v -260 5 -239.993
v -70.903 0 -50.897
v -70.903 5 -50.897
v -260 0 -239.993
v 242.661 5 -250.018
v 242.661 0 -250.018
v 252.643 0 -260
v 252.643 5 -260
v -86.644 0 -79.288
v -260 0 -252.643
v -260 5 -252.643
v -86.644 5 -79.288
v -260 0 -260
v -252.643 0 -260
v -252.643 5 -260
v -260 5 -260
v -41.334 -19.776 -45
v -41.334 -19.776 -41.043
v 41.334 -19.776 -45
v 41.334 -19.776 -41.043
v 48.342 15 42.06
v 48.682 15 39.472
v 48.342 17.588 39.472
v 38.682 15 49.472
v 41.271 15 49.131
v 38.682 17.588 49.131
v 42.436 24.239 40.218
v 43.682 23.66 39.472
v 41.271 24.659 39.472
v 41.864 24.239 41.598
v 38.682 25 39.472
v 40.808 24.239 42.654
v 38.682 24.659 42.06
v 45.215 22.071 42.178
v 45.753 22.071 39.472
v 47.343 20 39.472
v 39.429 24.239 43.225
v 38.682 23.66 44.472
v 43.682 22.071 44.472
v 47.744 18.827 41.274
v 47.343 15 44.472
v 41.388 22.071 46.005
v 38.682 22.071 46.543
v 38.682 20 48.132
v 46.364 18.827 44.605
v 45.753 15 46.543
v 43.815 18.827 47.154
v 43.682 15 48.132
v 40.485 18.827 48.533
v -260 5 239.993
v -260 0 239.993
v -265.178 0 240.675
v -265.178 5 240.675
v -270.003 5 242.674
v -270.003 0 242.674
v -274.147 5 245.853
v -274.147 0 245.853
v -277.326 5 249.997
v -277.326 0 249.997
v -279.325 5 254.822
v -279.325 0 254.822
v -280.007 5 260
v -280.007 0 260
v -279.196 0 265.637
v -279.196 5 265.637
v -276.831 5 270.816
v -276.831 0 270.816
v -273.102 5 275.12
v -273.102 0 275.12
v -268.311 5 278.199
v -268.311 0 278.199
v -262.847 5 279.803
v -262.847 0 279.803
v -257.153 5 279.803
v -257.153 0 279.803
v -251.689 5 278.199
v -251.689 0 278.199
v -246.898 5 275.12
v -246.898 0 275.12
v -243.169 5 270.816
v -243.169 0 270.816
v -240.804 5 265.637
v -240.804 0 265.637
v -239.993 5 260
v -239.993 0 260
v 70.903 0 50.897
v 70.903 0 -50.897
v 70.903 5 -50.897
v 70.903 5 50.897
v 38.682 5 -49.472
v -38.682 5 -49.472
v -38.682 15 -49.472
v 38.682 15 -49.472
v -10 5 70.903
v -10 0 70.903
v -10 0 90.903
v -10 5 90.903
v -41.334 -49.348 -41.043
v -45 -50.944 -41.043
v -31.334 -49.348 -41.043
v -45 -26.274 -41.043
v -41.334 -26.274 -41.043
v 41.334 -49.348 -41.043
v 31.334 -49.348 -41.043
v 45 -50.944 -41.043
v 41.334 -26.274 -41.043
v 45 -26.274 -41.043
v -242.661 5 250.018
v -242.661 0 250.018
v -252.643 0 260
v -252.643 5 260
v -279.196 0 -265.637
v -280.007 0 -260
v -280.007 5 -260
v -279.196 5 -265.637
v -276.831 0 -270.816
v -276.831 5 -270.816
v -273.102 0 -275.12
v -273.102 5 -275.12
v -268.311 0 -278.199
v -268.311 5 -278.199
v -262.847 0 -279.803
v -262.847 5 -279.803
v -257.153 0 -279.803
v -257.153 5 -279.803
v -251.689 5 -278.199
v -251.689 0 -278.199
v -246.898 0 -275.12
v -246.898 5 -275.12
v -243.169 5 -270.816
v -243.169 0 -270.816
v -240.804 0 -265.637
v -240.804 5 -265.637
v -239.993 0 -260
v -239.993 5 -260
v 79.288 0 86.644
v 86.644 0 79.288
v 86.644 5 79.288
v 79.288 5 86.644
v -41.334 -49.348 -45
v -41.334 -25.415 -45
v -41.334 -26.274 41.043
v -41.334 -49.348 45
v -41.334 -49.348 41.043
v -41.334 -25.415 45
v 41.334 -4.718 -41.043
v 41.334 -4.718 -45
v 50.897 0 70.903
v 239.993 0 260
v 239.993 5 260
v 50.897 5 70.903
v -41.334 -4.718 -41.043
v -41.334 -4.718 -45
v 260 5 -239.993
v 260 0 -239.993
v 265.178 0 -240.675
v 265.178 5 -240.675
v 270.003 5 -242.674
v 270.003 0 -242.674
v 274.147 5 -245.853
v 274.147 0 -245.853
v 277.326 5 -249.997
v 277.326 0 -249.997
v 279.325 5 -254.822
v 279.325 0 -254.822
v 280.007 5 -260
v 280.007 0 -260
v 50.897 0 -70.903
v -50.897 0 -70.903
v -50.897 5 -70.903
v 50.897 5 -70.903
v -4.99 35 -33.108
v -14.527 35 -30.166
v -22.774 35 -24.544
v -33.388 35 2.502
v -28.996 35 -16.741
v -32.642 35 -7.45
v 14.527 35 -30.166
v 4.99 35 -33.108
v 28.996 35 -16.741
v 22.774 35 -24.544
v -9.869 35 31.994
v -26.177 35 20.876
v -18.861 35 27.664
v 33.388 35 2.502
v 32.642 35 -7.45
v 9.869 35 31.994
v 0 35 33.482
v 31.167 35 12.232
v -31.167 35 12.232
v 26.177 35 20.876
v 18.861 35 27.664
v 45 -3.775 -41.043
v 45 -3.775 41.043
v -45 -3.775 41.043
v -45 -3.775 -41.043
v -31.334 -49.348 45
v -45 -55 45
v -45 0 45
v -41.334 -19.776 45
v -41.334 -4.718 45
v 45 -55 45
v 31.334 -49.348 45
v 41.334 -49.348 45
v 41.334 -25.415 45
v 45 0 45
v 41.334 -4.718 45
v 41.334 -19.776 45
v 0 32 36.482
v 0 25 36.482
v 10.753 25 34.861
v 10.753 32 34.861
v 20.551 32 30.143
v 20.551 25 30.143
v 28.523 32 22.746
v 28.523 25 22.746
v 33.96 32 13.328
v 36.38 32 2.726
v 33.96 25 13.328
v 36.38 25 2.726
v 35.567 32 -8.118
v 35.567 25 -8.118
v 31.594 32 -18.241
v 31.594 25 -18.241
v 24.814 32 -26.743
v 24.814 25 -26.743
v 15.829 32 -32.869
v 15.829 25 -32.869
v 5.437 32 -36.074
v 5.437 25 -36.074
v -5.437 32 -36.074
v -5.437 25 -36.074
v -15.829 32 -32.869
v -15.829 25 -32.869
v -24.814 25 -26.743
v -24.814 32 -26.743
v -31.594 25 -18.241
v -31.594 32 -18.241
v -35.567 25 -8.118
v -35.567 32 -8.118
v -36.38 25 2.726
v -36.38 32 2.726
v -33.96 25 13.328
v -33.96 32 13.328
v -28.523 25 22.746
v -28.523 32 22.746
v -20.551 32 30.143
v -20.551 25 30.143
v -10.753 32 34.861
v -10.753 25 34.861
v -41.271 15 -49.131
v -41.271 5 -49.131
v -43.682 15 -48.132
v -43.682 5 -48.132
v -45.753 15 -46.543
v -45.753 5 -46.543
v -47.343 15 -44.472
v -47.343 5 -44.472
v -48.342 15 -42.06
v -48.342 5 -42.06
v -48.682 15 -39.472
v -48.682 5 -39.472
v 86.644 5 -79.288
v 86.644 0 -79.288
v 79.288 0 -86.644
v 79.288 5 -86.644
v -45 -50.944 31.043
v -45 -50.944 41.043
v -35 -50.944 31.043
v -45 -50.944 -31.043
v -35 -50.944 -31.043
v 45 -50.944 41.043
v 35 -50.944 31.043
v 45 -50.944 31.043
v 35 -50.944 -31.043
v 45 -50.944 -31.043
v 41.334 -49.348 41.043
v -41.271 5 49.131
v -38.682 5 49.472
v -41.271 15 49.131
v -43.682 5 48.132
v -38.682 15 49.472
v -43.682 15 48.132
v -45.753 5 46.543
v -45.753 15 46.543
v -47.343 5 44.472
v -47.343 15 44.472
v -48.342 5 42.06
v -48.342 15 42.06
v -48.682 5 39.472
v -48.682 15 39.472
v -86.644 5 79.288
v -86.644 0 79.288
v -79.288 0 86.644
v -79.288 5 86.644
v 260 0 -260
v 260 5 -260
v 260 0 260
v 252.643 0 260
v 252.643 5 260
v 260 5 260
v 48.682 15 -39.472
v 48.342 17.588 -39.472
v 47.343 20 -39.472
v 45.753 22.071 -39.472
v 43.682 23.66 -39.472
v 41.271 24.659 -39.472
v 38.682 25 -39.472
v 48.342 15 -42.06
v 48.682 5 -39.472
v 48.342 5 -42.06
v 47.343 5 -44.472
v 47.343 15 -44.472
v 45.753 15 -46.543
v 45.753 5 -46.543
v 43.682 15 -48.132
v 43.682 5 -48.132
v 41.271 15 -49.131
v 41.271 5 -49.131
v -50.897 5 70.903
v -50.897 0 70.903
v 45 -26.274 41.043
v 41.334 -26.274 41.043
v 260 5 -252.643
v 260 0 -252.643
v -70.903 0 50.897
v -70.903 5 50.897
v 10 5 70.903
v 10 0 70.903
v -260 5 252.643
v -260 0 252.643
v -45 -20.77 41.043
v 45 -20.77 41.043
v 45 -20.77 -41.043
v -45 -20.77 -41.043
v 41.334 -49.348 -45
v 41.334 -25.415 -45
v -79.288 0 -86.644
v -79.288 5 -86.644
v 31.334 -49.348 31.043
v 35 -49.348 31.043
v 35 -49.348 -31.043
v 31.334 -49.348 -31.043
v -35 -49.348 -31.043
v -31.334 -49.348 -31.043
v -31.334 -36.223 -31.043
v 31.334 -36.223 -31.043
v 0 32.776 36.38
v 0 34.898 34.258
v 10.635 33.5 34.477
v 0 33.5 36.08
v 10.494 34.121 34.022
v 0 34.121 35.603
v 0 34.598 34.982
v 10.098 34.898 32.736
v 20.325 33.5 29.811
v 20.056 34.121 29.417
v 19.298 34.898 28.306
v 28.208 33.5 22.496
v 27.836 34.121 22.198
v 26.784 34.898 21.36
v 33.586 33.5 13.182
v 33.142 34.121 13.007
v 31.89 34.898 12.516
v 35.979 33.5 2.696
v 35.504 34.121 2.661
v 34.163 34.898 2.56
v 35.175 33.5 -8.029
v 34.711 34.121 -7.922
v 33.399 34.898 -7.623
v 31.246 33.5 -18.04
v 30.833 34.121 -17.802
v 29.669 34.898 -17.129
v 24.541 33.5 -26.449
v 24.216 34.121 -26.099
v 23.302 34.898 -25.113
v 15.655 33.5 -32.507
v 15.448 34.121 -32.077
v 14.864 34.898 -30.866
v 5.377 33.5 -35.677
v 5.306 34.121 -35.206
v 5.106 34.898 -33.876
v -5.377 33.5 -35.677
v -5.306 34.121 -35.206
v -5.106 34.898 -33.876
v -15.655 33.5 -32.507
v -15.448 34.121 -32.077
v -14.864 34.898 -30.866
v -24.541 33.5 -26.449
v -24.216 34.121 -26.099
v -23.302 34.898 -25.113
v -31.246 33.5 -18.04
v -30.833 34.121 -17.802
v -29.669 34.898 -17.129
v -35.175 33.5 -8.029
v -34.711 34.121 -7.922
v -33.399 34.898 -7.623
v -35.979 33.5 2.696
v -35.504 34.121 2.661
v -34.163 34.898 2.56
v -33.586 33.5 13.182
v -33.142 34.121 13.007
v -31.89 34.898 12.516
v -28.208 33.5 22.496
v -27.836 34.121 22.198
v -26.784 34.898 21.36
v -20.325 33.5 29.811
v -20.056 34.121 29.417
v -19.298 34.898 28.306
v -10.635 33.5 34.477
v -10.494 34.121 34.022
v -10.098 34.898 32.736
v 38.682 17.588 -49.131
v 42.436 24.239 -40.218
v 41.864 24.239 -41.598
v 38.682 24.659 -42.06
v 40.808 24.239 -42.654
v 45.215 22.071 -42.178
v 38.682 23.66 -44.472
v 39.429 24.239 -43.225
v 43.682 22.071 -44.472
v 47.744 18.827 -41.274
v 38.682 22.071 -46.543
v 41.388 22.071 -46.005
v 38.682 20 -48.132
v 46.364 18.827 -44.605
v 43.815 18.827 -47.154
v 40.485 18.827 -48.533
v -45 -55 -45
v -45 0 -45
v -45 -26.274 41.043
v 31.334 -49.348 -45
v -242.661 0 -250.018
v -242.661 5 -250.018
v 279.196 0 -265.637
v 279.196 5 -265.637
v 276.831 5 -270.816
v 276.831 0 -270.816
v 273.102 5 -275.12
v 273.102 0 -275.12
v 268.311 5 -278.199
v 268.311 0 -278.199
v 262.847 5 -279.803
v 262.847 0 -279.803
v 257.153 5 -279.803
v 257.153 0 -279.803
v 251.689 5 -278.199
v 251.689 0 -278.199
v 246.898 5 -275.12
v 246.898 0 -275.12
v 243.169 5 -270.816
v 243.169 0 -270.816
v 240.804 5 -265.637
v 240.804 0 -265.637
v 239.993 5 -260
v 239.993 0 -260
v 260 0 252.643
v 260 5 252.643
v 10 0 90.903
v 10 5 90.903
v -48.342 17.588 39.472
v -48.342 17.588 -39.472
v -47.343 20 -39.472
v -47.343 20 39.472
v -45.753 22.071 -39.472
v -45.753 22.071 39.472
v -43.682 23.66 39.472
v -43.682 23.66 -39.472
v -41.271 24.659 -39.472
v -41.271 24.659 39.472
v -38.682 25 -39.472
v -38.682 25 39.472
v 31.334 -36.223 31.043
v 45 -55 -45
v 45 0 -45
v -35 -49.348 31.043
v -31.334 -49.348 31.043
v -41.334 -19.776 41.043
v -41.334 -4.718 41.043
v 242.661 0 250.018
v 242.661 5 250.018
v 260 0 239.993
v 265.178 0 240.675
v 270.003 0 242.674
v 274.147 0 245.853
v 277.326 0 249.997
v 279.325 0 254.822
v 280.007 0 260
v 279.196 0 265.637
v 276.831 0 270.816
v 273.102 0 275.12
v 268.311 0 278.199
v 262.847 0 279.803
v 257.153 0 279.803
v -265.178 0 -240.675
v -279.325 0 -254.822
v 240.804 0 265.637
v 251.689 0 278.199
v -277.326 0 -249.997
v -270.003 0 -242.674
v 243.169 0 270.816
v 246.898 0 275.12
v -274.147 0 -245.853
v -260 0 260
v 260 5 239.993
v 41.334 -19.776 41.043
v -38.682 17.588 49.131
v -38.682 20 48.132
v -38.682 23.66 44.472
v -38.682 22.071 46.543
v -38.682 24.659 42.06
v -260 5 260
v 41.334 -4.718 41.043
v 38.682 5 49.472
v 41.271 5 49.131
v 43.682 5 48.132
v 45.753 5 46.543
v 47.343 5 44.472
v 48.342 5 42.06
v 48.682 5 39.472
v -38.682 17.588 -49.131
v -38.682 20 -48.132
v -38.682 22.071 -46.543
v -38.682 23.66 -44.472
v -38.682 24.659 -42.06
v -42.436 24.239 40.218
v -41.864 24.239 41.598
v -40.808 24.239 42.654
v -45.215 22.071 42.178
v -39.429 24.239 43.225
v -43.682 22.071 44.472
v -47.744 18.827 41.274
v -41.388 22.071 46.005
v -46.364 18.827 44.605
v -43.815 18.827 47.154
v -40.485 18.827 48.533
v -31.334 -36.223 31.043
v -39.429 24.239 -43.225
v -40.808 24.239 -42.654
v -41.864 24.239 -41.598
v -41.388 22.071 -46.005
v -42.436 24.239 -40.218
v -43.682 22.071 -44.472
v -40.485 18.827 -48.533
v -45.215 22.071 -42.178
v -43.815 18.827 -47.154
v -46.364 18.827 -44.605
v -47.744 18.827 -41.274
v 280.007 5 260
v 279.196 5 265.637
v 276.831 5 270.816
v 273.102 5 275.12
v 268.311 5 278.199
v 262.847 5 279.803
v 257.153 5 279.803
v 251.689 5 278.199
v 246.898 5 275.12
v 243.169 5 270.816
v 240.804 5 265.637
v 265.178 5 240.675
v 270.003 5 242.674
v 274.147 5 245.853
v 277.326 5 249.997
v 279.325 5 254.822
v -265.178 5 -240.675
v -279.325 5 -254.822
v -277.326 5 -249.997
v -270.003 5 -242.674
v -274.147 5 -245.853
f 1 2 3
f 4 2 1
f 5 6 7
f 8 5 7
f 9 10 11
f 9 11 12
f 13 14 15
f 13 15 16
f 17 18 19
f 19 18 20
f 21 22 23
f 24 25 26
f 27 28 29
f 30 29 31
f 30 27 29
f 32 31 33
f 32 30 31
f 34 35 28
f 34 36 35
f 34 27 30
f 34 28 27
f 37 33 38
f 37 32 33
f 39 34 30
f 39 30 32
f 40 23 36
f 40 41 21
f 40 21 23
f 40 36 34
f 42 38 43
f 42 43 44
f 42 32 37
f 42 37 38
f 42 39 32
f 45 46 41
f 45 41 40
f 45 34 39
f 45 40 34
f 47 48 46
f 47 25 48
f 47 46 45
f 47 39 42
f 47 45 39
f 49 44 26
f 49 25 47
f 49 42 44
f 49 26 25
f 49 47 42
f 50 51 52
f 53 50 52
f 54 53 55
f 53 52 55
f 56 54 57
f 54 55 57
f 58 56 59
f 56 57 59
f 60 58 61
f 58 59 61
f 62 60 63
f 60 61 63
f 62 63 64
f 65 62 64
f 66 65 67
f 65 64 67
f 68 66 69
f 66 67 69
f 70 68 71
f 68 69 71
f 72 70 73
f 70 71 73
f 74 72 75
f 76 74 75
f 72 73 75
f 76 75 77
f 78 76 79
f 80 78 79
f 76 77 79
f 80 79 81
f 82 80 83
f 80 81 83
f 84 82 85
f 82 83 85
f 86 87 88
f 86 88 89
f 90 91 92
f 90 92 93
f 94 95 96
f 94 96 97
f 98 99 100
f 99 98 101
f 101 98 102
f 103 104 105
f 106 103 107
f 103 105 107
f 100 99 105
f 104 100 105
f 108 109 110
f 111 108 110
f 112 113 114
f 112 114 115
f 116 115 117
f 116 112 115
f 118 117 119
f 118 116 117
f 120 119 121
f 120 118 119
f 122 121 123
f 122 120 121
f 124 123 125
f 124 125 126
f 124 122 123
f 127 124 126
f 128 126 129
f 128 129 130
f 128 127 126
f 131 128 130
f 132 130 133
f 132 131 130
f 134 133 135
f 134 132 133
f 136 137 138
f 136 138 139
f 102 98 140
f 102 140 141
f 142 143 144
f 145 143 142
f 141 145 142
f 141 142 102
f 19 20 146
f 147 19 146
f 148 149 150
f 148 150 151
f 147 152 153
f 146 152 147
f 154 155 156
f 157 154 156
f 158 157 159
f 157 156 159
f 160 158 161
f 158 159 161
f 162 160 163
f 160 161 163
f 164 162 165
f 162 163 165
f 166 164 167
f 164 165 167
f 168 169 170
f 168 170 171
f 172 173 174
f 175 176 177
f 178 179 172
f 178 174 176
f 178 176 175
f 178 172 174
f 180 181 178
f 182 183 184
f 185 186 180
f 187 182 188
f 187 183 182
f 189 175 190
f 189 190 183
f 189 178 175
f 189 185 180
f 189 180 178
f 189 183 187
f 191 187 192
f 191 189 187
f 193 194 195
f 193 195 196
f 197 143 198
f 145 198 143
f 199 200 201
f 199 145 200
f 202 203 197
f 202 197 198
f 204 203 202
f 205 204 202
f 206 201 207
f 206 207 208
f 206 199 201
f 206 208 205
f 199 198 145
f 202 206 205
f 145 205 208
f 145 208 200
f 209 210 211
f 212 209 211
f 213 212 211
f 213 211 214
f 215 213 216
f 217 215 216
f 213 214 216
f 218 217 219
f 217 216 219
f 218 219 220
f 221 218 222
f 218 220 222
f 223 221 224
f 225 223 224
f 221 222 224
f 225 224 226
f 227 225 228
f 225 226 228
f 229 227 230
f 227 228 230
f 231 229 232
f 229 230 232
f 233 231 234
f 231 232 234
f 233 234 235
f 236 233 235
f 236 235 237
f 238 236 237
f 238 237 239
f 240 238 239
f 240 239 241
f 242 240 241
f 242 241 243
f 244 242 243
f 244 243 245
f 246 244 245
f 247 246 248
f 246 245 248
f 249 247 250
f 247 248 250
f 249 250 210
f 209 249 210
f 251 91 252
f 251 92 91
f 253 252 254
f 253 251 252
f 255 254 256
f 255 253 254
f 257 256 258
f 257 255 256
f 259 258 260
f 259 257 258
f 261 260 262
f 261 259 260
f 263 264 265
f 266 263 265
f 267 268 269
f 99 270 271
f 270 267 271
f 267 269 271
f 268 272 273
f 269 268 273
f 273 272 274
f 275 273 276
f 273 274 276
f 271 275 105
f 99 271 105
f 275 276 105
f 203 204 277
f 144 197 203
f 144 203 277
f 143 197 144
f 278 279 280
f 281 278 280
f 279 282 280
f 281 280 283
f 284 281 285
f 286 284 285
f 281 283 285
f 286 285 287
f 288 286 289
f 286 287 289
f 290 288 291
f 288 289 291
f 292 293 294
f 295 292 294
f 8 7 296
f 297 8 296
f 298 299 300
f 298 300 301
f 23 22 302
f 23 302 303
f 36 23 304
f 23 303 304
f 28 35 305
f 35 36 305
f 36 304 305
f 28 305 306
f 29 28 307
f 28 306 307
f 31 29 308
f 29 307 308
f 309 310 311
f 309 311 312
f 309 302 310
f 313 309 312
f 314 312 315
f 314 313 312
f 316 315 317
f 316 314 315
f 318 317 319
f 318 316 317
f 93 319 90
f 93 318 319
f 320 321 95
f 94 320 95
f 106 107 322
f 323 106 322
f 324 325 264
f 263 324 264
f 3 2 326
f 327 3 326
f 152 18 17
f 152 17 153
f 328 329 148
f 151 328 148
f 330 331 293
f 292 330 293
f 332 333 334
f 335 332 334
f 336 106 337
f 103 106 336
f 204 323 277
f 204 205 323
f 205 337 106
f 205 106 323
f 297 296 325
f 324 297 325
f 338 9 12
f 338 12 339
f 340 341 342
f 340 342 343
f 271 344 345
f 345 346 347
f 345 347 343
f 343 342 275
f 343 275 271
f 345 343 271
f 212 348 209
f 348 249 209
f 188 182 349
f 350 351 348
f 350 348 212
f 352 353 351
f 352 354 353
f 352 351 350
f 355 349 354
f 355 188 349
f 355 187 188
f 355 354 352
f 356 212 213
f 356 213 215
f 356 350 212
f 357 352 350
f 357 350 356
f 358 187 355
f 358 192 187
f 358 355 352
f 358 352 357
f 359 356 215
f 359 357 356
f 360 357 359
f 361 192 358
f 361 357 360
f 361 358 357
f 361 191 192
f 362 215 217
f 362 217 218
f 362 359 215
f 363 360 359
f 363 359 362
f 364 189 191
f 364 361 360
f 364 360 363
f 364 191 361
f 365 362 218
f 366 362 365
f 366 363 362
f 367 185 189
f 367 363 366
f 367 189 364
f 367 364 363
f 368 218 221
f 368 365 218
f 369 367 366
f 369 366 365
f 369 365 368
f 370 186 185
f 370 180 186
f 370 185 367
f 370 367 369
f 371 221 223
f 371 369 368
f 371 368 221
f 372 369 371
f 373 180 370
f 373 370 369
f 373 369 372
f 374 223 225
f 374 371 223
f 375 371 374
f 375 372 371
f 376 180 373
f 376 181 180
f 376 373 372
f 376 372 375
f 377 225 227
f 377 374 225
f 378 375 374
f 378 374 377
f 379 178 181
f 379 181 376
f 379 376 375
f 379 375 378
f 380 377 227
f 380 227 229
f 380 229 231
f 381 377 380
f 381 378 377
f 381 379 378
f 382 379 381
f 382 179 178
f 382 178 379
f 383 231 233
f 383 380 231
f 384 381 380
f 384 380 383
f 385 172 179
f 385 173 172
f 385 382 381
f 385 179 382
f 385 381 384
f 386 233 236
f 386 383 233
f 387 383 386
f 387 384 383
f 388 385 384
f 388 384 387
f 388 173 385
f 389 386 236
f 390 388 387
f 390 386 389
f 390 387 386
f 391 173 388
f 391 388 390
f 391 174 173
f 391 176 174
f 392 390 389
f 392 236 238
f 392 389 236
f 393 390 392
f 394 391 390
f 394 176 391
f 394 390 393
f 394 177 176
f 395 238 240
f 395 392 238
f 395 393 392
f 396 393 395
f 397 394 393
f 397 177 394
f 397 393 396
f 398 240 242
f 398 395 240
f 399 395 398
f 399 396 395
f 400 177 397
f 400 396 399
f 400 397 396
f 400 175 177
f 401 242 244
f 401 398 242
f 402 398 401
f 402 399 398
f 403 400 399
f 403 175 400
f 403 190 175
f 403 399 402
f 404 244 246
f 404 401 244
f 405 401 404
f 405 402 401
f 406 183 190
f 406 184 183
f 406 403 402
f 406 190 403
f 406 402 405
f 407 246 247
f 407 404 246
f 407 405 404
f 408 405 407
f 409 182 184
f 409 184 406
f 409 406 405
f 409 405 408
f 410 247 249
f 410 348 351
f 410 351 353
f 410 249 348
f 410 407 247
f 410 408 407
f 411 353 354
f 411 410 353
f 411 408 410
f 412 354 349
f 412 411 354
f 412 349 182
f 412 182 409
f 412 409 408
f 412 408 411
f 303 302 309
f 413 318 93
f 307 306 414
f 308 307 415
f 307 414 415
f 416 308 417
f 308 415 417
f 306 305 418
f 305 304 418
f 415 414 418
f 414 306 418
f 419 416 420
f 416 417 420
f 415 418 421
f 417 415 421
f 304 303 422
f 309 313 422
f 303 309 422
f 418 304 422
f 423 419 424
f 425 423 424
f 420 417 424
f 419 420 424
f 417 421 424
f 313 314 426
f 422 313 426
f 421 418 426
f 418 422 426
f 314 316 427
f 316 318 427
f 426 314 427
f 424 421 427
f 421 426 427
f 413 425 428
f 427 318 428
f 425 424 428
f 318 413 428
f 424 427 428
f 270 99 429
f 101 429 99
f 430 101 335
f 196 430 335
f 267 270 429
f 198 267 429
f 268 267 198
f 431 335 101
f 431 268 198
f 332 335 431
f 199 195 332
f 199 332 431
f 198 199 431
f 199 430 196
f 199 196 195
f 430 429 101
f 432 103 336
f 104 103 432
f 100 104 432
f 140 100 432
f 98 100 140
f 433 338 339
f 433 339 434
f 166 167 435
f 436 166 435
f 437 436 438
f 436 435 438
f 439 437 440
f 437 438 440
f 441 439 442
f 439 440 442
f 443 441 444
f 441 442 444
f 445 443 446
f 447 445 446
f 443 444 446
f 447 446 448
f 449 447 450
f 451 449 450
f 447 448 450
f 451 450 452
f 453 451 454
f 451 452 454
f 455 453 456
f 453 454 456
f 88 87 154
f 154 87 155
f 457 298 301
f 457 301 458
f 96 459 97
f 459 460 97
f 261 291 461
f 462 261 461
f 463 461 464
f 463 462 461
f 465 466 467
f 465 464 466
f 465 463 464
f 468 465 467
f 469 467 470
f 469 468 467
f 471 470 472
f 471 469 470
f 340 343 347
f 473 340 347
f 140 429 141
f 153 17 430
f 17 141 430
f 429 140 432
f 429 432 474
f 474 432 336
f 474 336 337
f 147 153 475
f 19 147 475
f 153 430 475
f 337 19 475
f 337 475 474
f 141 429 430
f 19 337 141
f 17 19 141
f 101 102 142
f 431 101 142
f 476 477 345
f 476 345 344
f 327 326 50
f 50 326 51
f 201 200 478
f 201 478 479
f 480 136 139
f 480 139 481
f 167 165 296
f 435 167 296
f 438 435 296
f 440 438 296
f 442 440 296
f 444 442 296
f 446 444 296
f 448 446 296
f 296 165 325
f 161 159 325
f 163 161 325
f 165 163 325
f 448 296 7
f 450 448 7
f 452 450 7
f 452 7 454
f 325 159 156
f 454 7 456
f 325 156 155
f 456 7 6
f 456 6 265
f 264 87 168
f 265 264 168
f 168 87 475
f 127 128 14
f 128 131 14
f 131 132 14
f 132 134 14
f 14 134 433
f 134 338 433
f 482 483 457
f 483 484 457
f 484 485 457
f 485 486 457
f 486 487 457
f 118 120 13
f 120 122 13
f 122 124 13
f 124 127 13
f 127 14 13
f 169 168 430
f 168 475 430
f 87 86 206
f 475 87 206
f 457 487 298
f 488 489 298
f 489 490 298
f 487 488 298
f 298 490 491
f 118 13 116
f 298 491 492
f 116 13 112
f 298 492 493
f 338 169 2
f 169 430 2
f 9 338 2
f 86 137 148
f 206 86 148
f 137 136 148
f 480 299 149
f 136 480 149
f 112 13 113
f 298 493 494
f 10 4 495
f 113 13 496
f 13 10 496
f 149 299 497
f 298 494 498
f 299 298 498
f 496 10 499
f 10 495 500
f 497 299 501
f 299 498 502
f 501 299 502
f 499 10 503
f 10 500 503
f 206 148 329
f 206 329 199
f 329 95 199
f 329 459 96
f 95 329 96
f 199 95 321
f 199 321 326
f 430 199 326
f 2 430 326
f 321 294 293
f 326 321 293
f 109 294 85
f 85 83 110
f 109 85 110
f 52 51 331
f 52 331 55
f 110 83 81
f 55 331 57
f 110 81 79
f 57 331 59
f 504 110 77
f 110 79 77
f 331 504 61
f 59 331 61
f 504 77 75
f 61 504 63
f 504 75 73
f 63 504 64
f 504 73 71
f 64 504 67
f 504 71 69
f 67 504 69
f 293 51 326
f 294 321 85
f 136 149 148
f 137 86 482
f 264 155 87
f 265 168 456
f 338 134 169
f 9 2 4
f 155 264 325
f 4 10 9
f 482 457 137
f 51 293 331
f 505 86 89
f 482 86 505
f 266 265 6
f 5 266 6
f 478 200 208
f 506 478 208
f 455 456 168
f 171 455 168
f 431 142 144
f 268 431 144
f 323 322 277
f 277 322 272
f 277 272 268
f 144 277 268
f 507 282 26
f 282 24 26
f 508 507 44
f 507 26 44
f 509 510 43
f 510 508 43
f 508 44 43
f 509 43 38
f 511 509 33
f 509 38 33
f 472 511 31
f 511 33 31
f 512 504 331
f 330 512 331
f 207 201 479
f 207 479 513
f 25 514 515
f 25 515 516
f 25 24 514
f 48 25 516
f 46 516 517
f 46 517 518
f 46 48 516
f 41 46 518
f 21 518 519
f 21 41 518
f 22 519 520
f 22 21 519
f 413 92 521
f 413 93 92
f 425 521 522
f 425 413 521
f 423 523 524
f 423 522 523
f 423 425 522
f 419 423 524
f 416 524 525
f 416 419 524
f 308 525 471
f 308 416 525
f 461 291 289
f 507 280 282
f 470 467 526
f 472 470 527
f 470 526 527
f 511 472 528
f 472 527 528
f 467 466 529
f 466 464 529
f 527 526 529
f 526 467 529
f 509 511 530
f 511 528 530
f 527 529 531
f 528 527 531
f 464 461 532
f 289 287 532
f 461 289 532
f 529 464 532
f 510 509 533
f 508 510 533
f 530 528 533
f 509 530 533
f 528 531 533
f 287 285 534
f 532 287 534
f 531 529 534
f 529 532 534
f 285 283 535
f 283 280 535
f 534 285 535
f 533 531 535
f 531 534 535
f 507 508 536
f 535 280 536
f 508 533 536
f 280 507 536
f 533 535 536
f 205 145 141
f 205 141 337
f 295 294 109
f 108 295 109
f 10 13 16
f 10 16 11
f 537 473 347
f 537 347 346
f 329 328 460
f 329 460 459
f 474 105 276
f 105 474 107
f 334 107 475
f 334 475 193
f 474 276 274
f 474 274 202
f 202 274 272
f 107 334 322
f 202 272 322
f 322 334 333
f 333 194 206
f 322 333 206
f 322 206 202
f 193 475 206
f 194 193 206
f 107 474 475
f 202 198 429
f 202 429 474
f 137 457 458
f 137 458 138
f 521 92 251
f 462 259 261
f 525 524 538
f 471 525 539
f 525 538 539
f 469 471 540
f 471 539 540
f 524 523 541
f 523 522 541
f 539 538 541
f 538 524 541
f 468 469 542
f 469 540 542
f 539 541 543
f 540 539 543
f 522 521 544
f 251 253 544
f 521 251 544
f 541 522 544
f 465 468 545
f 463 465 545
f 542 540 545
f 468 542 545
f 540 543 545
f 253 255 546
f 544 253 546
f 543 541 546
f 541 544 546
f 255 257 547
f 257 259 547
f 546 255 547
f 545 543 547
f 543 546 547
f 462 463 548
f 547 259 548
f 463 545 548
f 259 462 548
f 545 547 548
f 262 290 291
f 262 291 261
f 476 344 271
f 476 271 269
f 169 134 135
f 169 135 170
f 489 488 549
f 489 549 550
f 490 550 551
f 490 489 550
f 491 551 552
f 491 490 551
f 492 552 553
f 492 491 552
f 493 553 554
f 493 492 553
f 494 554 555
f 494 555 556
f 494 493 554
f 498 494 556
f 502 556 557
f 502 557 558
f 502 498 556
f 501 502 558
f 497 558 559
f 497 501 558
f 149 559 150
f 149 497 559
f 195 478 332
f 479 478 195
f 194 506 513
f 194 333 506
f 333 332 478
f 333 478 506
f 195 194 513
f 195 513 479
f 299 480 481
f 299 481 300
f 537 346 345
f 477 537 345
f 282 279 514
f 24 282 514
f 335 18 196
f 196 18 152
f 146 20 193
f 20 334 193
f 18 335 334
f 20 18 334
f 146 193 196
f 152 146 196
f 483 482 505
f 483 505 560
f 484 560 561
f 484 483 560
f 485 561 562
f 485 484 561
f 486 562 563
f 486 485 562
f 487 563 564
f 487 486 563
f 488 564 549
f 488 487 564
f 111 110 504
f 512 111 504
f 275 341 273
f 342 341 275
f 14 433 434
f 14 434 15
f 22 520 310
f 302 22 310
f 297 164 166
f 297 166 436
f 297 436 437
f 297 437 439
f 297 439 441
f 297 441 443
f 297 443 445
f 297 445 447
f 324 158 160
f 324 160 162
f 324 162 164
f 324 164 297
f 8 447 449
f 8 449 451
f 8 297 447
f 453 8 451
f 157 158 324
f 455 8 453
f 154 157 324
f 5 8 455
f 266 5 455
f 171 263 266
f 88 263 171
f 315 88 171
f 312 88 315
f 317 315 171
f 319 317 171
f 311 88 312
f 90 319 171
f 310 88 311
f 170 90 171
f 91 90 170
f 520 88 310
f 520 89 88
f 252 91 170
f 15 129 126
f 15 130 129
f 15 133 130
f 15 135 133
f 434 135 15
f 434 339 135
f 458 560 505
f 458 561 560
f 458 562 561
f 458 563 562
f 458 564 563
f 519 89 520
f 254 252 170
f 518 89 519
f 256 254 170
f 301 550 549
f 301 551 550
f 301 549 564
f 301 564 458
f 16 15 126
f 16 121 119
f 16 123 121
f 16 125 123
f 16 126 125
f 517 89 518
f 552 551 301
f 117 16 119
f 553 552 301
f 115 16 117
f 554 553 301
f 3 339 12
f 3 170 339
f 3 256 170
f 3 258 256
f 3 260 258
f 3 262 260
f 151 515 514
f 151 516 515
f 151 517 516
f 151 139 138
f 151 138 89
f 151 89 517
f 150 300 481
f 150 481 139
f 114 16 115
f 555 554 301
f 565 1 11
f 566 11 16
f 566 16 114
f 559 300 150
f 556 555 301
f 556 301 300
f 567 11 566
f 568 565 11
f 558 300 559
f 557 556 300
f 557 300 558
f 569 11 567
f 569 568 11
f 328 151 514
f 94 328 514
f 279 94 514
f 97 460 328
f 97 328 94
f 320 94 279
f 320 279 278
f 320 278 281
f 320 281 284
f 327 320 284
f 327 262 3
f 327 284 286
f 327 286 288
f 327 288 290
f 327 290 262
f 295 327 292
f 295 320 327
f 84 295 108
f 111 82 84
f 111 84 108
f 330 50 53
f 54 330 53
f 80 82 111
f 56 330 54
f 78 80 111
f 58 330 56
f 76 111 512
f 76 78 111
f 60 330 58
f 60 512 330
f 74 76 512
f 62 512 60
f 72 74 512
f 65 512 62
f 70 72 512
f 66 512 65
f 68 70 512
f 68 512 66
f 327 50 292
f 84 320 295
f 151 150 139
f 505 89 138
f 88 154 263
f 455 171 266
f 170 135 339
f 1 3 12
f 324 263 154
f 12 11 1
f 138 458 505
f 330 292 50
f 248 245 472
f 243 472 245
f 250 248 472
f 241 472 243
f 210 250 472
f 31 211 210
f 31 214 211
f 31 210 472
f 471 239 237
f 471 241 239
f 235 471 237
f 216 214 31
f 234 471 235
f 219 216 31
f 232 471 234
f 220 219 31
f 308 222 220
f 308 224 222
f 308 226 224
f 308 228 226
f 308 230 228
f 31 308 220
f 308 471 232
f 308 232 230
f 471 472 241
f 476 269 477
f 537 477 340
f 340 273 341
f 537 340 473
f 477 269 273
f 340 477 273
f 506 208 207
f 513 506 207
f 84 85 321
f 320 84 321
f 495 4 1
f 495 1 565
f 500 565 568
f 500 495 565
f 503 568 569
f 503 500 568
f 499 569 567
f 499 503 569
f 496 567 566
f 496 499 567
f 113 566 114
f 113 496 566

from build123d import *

# Parameters (mm, degrees)
EXTRUDE_1_DEPTH     = 5
SKETCH_2_W          = 90
SKETCH_2_H          = 90
EXTRUDE_2_DEPTH     = 25
SKETCH_3_W          = 82.667839838
SKETCH_3_H          = 15.058257345
CUT_EXTRUDE_1_DEPTH = 90
SKETCH_4_W          = 82.085695662
SKETCH_4_H          = 16.995101666
CUT_EXTRUDE_2_DEPTH = 90
SKETCH_5_W          = 97.364780094
SKETCH_5_H          = 98.94366842
EXTRUDE_3_DEPTH     = 20
FILLET_1_R          = 10
SKETCH_6_W          = 90
SKETCH_6_H          = 90
EXTRUDE_4_DEPTH     = 30
CUT_EXTRUDE_3_DEPTH = 90
SKETCH_8_W          = 62.667839838
SKETCH_8_H          = 13.124346315
CUT_EXTRUDE_4_DEPTH = 10
CUT_EXTRUDE_5_DEPTH = 90
SKETCH_10_W         = 62.085695662
SKETCH_10_H         = 21.626220655
CUT_EXTRUDE_6_DEPTH = 10
SKETCH_11_W         = 62.667839838
SKETCH_11_H         = 13.124346315
CUT_EXTRUDE_7_DEPTH = 10
SKETCH_12_W         = 62.085695662
SKETCH_12_H         = 21.626220655
CUT_EXTRUDE_8_DEPTH = 10
EXTRUDE_5_DEPTH     = 20
SKETCH_14_R         = 36.481947273
EXTRUDE_6_DEPTH     = 10
FILLET_2_R          = 3


with BuildPart() as part:
    # 草图1 → 凸台-拉伸1 (new body)
    with BuildSketch(Plane(origin=(0, 0, 0), x_dir=(1, 0, 0), z_dir=(0, 1, 0))):
        Polygon((0, 70.903454713), (0, 0), (70.90345471, 0), (70.90345471, 50.896669322), (70.90345471, 63.546624398), (70.90345471, 70.903454713), (63.546624395, 70.903454713), (50.896669319, 70.903454713), align=None)
        Polygon((72.962659229, 92.969444623), (50.896669319, 70.903454713), (63.546624395, 70.903454713), (79.287636767, 86.644467085), align=None)
        Polygon((70.90345471, 70.903454713), (70.90345471, 63.546624398), (86.644467082, 79.28763677), (79.287636767, 86.644467085), (63.546624395, 70.903454713), align=None)
        Polygon((70.90345471, 63.546624398), (70.90345471, 50.896669322), (92.96944462, 72.962659232), (86.644467082, 79.28763677), align=None)
        with BuildLine():
            ThreePointArc((242.661241038, 250.018071355), (240.67172678, 254.833829646), (239.993214606, 260))
            Line((239.993214606, 260), (72.962659229, 92.969444623))
            Line((72.962659229, 92.969444623), (79.287636767, 86.644467085))
            Line((79.287636767, 86.644467085), (242.661241038, 250.018071355))
        make_face()
        with BuildLine():
            Line((92.96944462, 72.962659232), (260, 239.993214612))
            ThreePointArc((260, 239.993214606), (254.833829644, 240.67172678), (250.018071352, 242.66124104))
            Line((250.018071352, 242.66124104), (86.644467082, 79.28763677))
            Line((86.644467082, 79.28763677), (92.96944462, 72.962659232))
        make_face()
        with BuildLine():
            Line((260, 252.643169688), (260, 239.993214612))
            ThreePointArc((260, 239.993214606), (274.146933622, 245.853066378), (280.006785394, 260))
            ThreePointArc((280.006785394, 260), (260, 280.006785394), (239.993214606, 260))
            Line((239.993214606, 260), (252.643169682, 260))
            Line((252.643169682, 260), (260, 260))
            Line((260, 260), (260, 252.643169688))
        make_face()
        with BuildLine():
            Line((252.643169682, 260), (239.993214606, 260))
            ThreePointArc((239.993214606, 260), (240.67172678, 254.833829646), (242.661241038, 250.018071355))
            Line((242.661241038, 250.018071355), (252.643169682, 260))
        make_face()
        with BuildLine():
            ThreePointArc((250.018071352, 242.66124104), (254.833829644, 240.67172678), (260, 239.993214606))
            Line((260, 239.993214612), (260, 252.643169688))
            Line((260, 252.643169688), (250.018071352, 242.66124104))
        make_face()
    extrude_1 = extrude(amount=EXTRUDE_1_DEPTH)

    # 镜向1: 凸台-拉伸1 across plane
    add(extrude_1.mirror(Plane(origin=(0, 5, 0), x_dir=(0, 0, 1), z_dir=(1, 0, 0))))

    # 镜向3: part across plane


with BuildPart() as part_1:
    add(part.part)
    add(part.part.mirror(Plane(origin=(0, 5, 0), x_dir=(1, 0, 0), z_dir=(0, 0, -1))))

    # 草图2 → 凸台-拉伸2 (add)
    with BuildSketch(Plane.XZ):
        Rectangle(SKETCH_2_W, SKETCH_2_H)
    extrude(amount=EXTRUDE_2_DEPTH)

    # 草图3 → 切除-拉伸1 (cut)
    with BuildSketch(Plane.XY.offset(45)):
        with Locations((0, -12.246888496)):
            Rectangle(SKETCH_3_W, SKETCH_3_H)
    extrude(amount=-CUT_EXTRUDE_1_DEPTH, mode=Mode.SUBTRACT)

    # 草图4 → 切除-拉伸2 (cut)
    with BuildSketch(Plane(origin=(45, 0, 0), x_dir=(0, 0, -1), z_dir=(1, 0, 0))):
        with Locations((0, -12.272398252)):
            Rectangle(SKETCH_4_W, SKETCH_4_H)
    extrude(amount=-CUT_EXTRUDE_2_DEPTH, mode=Mode.SUBTRACT)

    # 草图5 → 凸台-拉伸3 (add)
    with BuildSketch(Plane(origin=(0, 5, 0), x_dir=(1, 0, 0), z_dir=(0, 1, 0))):
        Rectangle(SKETCH_5_W, SKETCH_5_H)
    extrude(amount=EXTRUDE_3_DEPTH)

    # 圆角1
    fillet_1_edges = [part_1.edges().sort_by_distance(p)[0] for p in [
        (48.682390047, 15, 49.47183421),
        (48.682390047, 15, -49.47183421),
        (-48.682390047, 15, -49.47183421),
        (-48.682390047, 15, 49.47183421),
        (48.682390047, 25, 0),
        (0, 25, -49.47183421),
        (-48.682390047, 25, 0),
        (0, 25, 49.47183421),
    ]]
    fillet(fillet_1_edges, radius=FILLET_1_R)

    # 草图6 → 凸台-拉伸4 (add)
    with BuildSketch(Plane.XZ.offset(25)):
        Rectangle(SKETCH_6_W, SKETCH_6_H)
    extrude(amount=EXTRUDE_4_DEPTH)

    # 草图7 → 切除-拉伸3 (cut)
    with BuildSketch(Plane.XY.offset(45)):
        Polygon((-41.333919919, -25.414932676), (41.333919919, -25.414932676), (41.333919919, -49.347564191), (31.333919919, -49.347564191), (31.333919919, -36.223217876), (-31.333919919, -36.223217876), (-31.333919919, -49.347564191), (-41.333919919, -49.347564191), align=None)
    extrude(amount=-CUT_EXTRUDE_3_DEPTH, mode=Mode.SUBTRACT)

    # 草图8 → 切除-拉伸4 (cut)
    with BuildSketch(Plane.XY.offset(45)):
        with Locations((0, -42.785391034)):
            Rectangle(SKETCH_8_W, SKETCH_8_H)
    extrude(amount=-CUT_EXTRUDE_4_DEPTH, mode=Mode.SUBTRACT)

    # 草图9 → 切除-拉伸5 (cut)
    with BuildSketch(Plane(origin=(45, 0, 0), x_dir=(0, 0, -1), z_dir=(1, 0, 0))):
        Polygon((-41.042847831, -26.273596919), (-41.042847831, -50.943507888), (-31.042847831, -50.943507888), (-31.042847831, -29.317287233), (31.042847831, -29.317287233), (31.042847831, -50.943507888), (41.042847831, -50.943507888), (41.042847831, -26.273596919), align=None)
    extrude(amount=-CUT_EXTRUDE_5_DEPTH, mode=Mode.SUBTRACT)

    # 草图10 → 切除-拉伸6 (cut)
    with BuildSketch(Plane(origin=(45, 0, 0), x_dir=(0, 0, -1), z_dir=(1, 0, 0))):
        with Locations((0, -40.130397561)):
            Rectangle(SKETCH_10_W, SKETCH_10_H)
    extrude(amount=-CUT_EXTRUDE_6_DEPTH, mode=Mode.SUBTRACT)

    # 草图11 → 切除-拉伸7 (cut)
    with BuildSketch(Plane(origin=(0, 0, -45), x_dir=(-1, 0, 0), z_dir=(0, 0, -1))):
        with Locations((0, -42.785391034)):
            Rectangle(SKETCH_11_W, SKETCH_11_H)
    extrude(amount=-CUT_EXTRUDE_7_DEPTH, mode=Mode.SUBTRACT)

    # 草图12 → 切除-拉伸8 (cut)
    with BuildSketch(Plane.ZY.offset(45)):
        with Locations((0, -40.130397561)):
            Rectangle(SKETCH_12_W, SKETCH_12_H)
    extrude(amount=-CUT_EXTRUDE_8_DEPTH, mode=Mode.SUBTRACT)

    # 草图13 → 凸台-拉伸5 (add)
    with BuildSketch(Plane.XY.offset(70.903454713)):
        Polygon((0, 0), (-10, 0), (-10, 5), (10, 5), (10, 0), align=None)
    extrude(amount=EXTRUDE_5_DEPTH)

    # 草图14 → 凸台-拉伸6 (add)
    with BuildSketch(Plane(origin=(0, 25, 0), x_dir=(1, 0, 0), z_dir=(0, 1, 0))):
        with Locations(Location((0, 0, 0), (0, 0, 270))):
            Circle(SKETCH_14_R)
    extrude(amount=EXTRUDE_6_DEPTH)

    # 圆角2
    fillet_2_edges = [part_1.edges().sort_by_distance(p)[0] for p in [
        (0, 35, -36.481947273),
    ]]
    fillet(fillet_2_edges, radius=FILLET_2_R)


solid = part_1.part
